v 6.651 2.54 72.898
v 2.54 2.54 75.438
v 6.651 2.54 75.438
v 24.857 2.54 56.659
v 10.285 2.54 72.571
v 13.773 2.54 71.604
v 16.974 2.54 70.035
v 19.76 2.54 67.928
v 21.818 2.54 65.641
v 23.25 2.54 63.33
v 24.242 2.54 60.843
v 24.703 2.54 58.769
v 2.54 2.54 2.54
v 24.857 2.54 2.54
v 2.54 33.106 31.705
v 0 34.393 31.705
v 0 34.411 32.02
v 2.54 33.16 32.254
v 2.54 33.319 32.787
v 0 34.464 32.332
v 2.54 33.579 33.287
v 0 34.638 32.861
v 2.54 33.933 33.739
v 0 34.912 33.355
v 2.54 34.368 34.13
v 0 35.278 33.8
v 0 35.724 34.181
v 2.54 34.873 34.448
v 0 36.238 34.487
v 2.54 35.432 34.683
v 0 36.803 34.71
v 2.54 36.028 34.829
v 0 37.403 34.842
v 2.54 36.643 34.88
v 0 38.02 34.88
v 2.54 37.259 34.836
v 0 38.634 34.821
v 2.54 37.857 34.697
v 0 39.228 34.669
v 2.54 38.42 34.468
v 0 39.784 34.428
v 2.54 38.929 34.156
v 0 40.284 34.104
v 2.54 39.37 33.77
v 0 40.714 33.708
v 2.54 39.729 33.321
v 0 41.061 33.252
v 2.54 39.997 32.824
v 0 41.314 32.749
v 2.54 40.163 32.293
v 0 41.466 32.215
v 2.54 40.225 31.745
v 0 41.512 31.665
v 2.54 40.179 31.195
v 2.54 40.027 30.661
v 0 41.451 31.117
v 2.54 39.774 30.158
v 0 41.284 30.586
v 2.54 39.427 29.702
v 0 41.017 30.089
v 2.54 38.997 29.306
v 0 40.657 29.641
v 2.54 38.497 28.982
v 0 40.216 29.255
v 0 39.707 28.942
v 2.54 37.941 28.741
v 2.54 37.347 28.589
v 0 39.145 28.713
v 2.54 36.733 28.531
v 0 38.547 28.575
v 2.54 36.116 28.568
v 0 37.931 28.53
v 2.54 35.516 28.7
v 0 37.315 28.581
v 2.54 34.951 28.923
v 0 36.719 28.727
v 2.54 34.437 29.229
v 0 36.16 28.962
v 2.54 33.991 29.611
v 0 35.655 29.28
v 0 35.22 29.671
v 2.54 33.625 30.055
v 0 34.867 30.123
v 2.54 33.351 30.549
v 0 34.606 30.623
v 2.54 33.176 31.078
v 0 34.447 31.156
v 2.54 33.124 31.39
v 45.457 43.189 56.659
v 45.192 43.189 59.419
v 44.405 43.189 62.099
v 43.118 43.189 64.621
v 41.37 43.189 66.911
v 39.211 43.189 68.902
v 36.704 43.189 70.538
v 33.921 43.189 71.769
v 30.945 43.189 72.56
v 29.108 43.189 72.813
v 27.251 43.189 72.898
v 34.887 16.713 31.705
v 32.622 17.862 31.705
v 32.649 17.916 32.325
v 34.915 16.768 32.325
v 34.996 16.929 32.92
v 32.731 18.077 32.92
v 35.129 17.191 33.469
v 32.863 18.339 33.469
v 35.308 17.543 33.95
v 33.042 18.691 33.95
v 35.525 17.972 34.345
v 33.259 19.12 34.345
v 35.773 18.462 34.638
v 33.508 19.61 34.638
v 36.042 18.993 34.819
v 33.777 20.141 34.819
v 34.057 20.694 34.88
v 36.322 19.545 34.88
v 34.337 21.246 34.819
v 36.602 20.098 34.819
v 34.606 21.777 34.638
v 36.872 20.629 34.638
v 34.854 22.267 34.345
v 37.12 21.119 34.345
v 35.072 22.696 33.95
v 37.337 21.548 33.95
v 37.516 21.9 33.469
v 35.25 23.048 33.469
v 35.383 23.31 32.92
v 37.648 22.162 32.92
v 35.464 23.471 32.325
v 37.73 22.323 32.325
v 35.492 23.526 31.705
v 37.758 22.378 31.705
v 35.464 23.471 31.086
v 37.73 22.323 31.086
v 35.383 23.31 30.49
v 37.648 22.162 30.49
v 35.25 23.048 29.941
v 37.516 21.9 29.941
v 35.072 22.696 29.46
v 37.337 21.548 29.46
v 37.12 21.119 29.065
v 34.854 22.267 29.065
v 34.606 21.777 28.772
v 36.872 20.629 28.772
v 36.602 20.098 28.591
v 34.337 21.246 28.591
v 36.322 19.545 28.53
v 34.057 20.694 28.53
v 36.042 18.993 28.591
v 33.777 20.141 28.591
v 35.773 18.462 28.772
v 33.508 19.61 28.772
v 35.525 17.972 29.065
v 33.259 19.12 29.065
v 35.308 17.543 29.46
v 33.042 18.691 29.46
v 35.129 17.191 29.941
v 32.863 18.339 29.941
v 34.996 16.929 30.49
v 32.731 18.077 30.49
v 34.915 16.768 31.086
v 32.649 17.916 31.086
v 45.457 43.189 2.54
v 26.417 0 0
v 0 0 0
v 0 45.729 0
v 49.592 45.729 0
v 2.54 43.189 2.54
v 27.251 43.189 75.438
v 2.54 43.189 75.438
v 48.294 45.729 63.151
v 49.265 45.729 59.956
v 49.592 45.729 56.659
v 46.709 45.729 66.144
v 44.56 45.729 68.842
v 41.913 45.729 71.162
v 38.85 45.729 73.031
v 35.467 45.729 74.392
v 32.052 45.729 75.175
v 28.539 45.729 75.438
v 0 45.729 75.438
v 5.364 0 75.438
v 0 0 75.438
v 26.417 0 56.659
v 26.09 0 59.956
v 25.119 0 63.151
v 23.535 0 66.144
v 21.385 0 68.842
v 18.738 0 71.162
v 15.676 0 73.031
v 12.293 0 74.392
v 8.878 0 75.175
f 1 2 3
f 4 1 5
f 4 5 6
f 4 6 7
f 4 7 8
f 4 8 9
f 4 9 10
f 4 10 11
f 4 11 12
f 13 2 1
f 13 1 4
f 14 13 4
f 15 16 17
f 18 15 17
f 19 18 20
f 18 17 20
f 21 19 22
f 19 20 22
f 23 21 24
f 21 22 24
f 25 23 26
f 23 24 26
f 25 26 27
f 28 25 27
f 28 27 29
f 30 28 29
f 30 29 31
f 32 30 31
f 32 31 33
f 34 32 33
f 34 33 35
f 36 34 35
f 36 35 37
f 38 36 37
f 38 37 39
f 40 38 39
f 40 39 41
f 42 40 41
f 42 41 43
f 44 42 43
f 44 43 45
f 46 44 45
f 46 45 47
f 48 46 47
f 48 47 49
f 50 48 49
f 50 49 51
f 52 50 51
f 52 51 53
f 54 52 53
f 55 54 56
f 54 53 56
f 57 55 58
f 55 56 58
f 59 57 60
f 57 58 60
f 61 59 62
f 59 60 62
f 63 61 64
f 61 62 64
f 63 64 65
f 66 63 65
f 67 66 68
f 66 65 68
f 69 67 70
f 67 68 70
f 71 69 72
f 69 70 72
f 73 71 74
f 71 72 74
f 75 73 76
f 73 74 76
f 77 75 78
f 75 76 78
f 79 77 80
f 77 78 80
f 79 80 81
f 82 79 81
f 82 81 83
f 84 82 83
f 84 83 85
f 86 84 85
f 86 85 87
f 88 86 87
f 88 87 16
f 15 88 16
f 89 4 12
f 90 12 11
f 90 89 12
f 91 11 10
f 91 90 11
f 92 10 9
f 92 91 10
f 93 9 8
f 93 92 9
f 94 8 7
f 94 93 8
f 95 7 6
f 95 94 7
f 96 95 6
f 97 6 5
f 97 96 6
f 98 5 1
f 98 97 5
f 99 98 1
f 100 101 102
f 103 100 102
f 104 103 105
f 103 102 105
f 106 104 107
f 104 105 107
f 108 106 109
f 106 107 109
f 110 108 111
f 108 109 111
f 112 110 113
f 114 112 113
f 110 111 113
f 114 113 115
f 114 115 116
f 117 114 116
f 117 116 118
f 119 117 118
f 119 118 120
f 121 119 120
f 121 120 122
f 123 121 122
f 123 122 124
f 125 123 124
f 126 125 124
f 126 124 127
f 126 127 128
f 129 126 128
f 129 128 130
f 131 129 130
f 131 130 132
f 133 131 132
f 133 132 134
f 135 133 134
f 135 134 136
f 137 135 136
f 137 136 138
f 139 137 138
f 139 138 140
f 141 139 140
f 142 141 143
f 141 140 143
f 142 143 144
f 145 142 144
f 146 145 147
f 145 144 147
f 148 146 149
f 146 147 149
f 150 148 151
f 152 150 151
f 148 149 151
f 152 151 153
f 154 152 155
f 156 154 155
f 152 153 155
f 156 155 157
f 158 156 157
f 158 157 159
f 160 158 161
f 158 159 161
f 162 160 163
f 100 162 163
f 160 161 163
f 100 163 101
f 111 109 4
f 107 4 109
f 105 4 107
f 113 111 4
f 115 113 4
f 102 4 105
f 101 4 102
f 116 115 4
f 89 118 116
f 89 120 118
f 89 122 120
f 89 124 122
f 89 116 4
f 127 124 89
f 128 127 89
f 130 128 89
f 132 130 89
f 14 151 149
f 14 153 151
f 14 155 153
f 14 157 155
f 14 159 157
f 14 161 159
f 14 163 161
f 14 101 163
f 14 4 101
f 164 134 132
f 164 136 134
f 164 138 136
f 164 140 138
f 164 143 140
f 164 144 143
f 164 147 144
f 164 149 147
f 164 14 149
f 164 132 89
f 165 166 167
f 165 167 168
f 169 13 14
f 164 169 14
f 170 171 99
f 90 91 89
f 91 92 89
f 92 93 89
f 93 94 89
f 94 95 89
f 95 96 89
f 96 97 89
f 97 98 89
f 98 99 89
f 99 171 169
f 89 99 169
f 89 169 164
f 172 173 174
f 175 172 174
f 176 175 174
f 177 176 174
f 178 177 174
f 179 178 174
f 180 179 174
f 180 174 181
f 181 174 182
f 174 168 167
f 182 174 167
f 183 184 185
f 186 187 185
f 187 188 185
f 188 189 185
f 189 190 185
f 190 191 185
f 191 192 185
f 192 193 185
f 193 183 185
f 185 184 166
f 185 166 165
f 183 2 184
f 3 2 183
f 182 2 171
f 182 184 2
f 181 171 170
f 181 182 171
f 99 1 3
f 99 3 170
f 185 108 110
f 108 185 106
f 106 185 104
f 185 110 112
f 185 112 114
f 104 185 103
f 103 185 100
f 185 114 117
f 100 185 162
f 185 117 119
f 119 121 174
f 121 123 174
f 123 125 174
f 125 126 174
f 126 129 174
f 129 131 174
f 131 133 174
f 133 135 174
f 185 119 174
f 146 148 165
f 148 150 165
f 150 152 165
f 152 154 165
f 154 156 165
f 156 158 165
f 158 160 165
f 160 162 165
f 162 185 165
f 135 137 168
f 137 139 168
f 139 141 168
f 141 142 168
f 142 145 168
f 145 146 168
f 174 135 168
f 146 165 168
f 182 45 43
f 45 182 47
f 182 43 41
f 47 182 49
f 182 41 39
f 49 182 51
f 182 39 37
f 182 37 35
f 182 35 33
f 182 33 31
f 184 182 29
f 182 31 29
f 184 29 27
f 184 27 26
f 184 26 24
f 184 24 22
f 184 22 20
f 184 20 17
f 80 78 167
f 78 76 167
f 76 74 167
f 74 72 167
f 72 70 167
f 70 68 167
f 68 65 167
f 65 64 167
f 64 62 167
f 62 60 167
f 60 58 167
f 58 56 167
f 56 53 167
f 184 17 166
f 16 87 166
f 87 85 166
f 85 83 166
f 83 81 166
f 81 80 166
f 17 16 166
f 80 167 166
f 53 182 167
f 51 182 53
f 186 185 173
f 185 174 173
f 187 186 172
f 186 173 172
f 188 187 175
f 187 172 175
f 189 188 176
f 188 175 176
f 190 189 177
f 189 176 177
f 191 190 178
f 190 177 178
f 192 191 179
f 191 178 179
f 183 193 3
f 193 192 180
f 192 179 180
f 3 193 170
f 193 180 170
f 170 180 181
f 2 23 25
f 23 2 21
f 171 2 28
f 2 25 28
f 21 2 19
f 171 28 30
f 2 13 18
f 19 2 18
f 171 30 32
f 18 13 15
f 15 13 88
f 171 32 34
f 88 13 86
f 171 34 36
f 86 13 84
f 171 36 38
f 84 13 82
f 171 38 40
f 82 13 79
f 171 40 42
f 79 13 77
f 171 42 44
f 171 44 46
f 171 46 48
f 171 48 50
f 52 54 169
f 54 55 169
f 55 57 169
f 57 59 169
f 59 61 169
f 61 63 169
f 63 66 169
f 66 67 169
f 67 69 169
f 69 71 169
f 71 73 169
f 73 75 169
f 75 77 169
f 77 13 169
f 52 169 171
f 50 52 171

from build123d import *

# Parameters (mm, degrees)
F1_DEPTH = 75.438
F2_R     = 18.7791754174
F3_T     = -2.54
F5_D     = 6.35


# Not quite as in the source:
# - a shell that OpenCascade refuses in one call is made with other operations: the cavity is built on its own and cut out


with BuildPart() as f1:
    # F0 (on Top) → F1 (new body)
    with BuildSketch(Plane.XY):
        Polygon((0, 45.7287728786), (0, 0), (26.4172311872, 0), (49.5915971696, 45.7287728786), align=None)
    extrude(amount=F1_DEPTH)

    # F2
    f2_edges = [f1.edges().sort_by_distance(p)[0] for p in [
        (38.004414, 22.864386, 75.438),
    ]]
    fillet(f2_edges, radius=F2_R)

    # F3: a shell. OpenCascade refuses it in one call, so the cavity is built on its own and cut out:
    # the body offset inwards by the wall thickness, plus a prism from it out through each open face.
    f3_core = offset(f1.part, amount=F3_T, kind=Kind.INTERSECTION, mode=Mode.PRIVATE)
    f3_exits = [f3_core.faces().sort_by_distance(p)[0] for p in [
        (10.972623, 27.706391, 72.898),
    ]]
    add(f3_core, mode=Mode.SUBTRACT)
    extrude(f3_exits, amount=-F3_T, mode=Mode.SUBTRACT)

    # F5 (through all)
    with Locations(Plane(origin=(21.0190277096, -10.6519945775, 0), x_dir=(0.4520442786, 0.891995499, 0), z_dir=(0.891995499, -0.4520442786, 0))):
        with Locations((33.8537804782, 31.7050926387)):
            Hole(F5_D / 2)


solid = f1.part
